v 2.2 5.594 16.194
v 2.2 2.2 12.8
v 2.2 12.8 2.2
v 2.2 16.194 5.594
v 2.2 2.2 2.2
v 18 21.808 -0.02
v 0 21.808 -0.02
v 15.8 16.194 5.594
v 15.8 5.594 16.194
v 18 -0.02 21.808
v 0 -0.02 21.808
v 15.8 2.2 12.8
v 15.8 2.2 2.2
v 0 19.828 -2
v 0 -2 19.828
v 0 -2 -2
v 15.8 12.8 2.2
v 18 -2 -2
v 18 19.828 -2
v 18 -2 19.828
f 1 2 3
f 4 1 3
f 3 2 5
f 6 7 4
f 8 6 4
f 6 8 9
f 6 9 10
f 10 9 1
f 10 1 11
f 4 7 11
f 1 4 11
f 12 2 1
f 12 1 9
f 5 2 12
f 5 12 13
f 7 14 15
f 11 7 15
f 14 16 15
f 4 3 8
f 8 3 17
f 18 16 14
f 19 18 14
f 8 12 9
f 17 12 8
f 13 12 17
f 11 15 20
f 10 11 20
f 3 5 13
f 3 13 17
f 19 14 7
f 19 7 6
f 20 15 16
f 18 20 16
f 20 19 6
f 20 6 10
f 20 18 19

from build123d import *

# Parameters (mm, degrees)
F1_DEPTH = 18
F2_T     = -2.2
F4_DEPTH = 18
F3_W     = 13.6
F3_H     = 14.9906637612
F5_DEPTH = 8.9
F6_DEPTH = 2.8


# Not quite as in the source:
# - a feature of the source that left no trace in its solid (it failed there, or was rolled back) is left out


with BuildPart() as f1:
    # F0 (on Right) → F1 (new body)
    with BuildSketch(Plane.YZ):
        Polygon((0, 15), (0, 0), (15, 0), align=None)
    extrude(amount=F1_DEPTH)

    # F2
    f2_openings = [f1.faces().sort_by_distance(p)[0] for p in [
        (9, 7.5, 7.5),
    ]]
    offset(amount=F2_T, openings=f2_openings)

    # F0 (on Right) → F4 (join)
    with BuildSketch(Plane.YZ):
        Polygon((15, 0), (0, 0), (0, 15), (2.8284271247, 15), (-2, 19.8284271247), (-2, -2), (19.8284271247, -2), (15, 2.8284271247), align=None)
        Polygon((0, 15), (15, 0), (15, 2.8284271247), (2.8284271247, 15), align=None)
    extrude(amount=F4_DEPTH)

    # F3 (on face) → F5 (cut)
    with BuildSketch(Plane(origin=(0, 7.5, 7.5), x_dir=(1, 0, 0), z_dir=(0, 0.7071067812, 0.7071067812))):
        with Locations((9, 0)):
            Rectangle(F3_W, F3_H)
    extrude(amount=F5_DEPTH, mode=Mode.SUBTRACT)

    # F6 (add): a face of the model
    f6_faces = [f1.faces().sort_by_distance(p)[0] for p in [
        (9, 19.5757454612, -1.7473183365),
    ]]
    extrude(f6_faces, amount=F6_DEPTH)


solid = f1.part
